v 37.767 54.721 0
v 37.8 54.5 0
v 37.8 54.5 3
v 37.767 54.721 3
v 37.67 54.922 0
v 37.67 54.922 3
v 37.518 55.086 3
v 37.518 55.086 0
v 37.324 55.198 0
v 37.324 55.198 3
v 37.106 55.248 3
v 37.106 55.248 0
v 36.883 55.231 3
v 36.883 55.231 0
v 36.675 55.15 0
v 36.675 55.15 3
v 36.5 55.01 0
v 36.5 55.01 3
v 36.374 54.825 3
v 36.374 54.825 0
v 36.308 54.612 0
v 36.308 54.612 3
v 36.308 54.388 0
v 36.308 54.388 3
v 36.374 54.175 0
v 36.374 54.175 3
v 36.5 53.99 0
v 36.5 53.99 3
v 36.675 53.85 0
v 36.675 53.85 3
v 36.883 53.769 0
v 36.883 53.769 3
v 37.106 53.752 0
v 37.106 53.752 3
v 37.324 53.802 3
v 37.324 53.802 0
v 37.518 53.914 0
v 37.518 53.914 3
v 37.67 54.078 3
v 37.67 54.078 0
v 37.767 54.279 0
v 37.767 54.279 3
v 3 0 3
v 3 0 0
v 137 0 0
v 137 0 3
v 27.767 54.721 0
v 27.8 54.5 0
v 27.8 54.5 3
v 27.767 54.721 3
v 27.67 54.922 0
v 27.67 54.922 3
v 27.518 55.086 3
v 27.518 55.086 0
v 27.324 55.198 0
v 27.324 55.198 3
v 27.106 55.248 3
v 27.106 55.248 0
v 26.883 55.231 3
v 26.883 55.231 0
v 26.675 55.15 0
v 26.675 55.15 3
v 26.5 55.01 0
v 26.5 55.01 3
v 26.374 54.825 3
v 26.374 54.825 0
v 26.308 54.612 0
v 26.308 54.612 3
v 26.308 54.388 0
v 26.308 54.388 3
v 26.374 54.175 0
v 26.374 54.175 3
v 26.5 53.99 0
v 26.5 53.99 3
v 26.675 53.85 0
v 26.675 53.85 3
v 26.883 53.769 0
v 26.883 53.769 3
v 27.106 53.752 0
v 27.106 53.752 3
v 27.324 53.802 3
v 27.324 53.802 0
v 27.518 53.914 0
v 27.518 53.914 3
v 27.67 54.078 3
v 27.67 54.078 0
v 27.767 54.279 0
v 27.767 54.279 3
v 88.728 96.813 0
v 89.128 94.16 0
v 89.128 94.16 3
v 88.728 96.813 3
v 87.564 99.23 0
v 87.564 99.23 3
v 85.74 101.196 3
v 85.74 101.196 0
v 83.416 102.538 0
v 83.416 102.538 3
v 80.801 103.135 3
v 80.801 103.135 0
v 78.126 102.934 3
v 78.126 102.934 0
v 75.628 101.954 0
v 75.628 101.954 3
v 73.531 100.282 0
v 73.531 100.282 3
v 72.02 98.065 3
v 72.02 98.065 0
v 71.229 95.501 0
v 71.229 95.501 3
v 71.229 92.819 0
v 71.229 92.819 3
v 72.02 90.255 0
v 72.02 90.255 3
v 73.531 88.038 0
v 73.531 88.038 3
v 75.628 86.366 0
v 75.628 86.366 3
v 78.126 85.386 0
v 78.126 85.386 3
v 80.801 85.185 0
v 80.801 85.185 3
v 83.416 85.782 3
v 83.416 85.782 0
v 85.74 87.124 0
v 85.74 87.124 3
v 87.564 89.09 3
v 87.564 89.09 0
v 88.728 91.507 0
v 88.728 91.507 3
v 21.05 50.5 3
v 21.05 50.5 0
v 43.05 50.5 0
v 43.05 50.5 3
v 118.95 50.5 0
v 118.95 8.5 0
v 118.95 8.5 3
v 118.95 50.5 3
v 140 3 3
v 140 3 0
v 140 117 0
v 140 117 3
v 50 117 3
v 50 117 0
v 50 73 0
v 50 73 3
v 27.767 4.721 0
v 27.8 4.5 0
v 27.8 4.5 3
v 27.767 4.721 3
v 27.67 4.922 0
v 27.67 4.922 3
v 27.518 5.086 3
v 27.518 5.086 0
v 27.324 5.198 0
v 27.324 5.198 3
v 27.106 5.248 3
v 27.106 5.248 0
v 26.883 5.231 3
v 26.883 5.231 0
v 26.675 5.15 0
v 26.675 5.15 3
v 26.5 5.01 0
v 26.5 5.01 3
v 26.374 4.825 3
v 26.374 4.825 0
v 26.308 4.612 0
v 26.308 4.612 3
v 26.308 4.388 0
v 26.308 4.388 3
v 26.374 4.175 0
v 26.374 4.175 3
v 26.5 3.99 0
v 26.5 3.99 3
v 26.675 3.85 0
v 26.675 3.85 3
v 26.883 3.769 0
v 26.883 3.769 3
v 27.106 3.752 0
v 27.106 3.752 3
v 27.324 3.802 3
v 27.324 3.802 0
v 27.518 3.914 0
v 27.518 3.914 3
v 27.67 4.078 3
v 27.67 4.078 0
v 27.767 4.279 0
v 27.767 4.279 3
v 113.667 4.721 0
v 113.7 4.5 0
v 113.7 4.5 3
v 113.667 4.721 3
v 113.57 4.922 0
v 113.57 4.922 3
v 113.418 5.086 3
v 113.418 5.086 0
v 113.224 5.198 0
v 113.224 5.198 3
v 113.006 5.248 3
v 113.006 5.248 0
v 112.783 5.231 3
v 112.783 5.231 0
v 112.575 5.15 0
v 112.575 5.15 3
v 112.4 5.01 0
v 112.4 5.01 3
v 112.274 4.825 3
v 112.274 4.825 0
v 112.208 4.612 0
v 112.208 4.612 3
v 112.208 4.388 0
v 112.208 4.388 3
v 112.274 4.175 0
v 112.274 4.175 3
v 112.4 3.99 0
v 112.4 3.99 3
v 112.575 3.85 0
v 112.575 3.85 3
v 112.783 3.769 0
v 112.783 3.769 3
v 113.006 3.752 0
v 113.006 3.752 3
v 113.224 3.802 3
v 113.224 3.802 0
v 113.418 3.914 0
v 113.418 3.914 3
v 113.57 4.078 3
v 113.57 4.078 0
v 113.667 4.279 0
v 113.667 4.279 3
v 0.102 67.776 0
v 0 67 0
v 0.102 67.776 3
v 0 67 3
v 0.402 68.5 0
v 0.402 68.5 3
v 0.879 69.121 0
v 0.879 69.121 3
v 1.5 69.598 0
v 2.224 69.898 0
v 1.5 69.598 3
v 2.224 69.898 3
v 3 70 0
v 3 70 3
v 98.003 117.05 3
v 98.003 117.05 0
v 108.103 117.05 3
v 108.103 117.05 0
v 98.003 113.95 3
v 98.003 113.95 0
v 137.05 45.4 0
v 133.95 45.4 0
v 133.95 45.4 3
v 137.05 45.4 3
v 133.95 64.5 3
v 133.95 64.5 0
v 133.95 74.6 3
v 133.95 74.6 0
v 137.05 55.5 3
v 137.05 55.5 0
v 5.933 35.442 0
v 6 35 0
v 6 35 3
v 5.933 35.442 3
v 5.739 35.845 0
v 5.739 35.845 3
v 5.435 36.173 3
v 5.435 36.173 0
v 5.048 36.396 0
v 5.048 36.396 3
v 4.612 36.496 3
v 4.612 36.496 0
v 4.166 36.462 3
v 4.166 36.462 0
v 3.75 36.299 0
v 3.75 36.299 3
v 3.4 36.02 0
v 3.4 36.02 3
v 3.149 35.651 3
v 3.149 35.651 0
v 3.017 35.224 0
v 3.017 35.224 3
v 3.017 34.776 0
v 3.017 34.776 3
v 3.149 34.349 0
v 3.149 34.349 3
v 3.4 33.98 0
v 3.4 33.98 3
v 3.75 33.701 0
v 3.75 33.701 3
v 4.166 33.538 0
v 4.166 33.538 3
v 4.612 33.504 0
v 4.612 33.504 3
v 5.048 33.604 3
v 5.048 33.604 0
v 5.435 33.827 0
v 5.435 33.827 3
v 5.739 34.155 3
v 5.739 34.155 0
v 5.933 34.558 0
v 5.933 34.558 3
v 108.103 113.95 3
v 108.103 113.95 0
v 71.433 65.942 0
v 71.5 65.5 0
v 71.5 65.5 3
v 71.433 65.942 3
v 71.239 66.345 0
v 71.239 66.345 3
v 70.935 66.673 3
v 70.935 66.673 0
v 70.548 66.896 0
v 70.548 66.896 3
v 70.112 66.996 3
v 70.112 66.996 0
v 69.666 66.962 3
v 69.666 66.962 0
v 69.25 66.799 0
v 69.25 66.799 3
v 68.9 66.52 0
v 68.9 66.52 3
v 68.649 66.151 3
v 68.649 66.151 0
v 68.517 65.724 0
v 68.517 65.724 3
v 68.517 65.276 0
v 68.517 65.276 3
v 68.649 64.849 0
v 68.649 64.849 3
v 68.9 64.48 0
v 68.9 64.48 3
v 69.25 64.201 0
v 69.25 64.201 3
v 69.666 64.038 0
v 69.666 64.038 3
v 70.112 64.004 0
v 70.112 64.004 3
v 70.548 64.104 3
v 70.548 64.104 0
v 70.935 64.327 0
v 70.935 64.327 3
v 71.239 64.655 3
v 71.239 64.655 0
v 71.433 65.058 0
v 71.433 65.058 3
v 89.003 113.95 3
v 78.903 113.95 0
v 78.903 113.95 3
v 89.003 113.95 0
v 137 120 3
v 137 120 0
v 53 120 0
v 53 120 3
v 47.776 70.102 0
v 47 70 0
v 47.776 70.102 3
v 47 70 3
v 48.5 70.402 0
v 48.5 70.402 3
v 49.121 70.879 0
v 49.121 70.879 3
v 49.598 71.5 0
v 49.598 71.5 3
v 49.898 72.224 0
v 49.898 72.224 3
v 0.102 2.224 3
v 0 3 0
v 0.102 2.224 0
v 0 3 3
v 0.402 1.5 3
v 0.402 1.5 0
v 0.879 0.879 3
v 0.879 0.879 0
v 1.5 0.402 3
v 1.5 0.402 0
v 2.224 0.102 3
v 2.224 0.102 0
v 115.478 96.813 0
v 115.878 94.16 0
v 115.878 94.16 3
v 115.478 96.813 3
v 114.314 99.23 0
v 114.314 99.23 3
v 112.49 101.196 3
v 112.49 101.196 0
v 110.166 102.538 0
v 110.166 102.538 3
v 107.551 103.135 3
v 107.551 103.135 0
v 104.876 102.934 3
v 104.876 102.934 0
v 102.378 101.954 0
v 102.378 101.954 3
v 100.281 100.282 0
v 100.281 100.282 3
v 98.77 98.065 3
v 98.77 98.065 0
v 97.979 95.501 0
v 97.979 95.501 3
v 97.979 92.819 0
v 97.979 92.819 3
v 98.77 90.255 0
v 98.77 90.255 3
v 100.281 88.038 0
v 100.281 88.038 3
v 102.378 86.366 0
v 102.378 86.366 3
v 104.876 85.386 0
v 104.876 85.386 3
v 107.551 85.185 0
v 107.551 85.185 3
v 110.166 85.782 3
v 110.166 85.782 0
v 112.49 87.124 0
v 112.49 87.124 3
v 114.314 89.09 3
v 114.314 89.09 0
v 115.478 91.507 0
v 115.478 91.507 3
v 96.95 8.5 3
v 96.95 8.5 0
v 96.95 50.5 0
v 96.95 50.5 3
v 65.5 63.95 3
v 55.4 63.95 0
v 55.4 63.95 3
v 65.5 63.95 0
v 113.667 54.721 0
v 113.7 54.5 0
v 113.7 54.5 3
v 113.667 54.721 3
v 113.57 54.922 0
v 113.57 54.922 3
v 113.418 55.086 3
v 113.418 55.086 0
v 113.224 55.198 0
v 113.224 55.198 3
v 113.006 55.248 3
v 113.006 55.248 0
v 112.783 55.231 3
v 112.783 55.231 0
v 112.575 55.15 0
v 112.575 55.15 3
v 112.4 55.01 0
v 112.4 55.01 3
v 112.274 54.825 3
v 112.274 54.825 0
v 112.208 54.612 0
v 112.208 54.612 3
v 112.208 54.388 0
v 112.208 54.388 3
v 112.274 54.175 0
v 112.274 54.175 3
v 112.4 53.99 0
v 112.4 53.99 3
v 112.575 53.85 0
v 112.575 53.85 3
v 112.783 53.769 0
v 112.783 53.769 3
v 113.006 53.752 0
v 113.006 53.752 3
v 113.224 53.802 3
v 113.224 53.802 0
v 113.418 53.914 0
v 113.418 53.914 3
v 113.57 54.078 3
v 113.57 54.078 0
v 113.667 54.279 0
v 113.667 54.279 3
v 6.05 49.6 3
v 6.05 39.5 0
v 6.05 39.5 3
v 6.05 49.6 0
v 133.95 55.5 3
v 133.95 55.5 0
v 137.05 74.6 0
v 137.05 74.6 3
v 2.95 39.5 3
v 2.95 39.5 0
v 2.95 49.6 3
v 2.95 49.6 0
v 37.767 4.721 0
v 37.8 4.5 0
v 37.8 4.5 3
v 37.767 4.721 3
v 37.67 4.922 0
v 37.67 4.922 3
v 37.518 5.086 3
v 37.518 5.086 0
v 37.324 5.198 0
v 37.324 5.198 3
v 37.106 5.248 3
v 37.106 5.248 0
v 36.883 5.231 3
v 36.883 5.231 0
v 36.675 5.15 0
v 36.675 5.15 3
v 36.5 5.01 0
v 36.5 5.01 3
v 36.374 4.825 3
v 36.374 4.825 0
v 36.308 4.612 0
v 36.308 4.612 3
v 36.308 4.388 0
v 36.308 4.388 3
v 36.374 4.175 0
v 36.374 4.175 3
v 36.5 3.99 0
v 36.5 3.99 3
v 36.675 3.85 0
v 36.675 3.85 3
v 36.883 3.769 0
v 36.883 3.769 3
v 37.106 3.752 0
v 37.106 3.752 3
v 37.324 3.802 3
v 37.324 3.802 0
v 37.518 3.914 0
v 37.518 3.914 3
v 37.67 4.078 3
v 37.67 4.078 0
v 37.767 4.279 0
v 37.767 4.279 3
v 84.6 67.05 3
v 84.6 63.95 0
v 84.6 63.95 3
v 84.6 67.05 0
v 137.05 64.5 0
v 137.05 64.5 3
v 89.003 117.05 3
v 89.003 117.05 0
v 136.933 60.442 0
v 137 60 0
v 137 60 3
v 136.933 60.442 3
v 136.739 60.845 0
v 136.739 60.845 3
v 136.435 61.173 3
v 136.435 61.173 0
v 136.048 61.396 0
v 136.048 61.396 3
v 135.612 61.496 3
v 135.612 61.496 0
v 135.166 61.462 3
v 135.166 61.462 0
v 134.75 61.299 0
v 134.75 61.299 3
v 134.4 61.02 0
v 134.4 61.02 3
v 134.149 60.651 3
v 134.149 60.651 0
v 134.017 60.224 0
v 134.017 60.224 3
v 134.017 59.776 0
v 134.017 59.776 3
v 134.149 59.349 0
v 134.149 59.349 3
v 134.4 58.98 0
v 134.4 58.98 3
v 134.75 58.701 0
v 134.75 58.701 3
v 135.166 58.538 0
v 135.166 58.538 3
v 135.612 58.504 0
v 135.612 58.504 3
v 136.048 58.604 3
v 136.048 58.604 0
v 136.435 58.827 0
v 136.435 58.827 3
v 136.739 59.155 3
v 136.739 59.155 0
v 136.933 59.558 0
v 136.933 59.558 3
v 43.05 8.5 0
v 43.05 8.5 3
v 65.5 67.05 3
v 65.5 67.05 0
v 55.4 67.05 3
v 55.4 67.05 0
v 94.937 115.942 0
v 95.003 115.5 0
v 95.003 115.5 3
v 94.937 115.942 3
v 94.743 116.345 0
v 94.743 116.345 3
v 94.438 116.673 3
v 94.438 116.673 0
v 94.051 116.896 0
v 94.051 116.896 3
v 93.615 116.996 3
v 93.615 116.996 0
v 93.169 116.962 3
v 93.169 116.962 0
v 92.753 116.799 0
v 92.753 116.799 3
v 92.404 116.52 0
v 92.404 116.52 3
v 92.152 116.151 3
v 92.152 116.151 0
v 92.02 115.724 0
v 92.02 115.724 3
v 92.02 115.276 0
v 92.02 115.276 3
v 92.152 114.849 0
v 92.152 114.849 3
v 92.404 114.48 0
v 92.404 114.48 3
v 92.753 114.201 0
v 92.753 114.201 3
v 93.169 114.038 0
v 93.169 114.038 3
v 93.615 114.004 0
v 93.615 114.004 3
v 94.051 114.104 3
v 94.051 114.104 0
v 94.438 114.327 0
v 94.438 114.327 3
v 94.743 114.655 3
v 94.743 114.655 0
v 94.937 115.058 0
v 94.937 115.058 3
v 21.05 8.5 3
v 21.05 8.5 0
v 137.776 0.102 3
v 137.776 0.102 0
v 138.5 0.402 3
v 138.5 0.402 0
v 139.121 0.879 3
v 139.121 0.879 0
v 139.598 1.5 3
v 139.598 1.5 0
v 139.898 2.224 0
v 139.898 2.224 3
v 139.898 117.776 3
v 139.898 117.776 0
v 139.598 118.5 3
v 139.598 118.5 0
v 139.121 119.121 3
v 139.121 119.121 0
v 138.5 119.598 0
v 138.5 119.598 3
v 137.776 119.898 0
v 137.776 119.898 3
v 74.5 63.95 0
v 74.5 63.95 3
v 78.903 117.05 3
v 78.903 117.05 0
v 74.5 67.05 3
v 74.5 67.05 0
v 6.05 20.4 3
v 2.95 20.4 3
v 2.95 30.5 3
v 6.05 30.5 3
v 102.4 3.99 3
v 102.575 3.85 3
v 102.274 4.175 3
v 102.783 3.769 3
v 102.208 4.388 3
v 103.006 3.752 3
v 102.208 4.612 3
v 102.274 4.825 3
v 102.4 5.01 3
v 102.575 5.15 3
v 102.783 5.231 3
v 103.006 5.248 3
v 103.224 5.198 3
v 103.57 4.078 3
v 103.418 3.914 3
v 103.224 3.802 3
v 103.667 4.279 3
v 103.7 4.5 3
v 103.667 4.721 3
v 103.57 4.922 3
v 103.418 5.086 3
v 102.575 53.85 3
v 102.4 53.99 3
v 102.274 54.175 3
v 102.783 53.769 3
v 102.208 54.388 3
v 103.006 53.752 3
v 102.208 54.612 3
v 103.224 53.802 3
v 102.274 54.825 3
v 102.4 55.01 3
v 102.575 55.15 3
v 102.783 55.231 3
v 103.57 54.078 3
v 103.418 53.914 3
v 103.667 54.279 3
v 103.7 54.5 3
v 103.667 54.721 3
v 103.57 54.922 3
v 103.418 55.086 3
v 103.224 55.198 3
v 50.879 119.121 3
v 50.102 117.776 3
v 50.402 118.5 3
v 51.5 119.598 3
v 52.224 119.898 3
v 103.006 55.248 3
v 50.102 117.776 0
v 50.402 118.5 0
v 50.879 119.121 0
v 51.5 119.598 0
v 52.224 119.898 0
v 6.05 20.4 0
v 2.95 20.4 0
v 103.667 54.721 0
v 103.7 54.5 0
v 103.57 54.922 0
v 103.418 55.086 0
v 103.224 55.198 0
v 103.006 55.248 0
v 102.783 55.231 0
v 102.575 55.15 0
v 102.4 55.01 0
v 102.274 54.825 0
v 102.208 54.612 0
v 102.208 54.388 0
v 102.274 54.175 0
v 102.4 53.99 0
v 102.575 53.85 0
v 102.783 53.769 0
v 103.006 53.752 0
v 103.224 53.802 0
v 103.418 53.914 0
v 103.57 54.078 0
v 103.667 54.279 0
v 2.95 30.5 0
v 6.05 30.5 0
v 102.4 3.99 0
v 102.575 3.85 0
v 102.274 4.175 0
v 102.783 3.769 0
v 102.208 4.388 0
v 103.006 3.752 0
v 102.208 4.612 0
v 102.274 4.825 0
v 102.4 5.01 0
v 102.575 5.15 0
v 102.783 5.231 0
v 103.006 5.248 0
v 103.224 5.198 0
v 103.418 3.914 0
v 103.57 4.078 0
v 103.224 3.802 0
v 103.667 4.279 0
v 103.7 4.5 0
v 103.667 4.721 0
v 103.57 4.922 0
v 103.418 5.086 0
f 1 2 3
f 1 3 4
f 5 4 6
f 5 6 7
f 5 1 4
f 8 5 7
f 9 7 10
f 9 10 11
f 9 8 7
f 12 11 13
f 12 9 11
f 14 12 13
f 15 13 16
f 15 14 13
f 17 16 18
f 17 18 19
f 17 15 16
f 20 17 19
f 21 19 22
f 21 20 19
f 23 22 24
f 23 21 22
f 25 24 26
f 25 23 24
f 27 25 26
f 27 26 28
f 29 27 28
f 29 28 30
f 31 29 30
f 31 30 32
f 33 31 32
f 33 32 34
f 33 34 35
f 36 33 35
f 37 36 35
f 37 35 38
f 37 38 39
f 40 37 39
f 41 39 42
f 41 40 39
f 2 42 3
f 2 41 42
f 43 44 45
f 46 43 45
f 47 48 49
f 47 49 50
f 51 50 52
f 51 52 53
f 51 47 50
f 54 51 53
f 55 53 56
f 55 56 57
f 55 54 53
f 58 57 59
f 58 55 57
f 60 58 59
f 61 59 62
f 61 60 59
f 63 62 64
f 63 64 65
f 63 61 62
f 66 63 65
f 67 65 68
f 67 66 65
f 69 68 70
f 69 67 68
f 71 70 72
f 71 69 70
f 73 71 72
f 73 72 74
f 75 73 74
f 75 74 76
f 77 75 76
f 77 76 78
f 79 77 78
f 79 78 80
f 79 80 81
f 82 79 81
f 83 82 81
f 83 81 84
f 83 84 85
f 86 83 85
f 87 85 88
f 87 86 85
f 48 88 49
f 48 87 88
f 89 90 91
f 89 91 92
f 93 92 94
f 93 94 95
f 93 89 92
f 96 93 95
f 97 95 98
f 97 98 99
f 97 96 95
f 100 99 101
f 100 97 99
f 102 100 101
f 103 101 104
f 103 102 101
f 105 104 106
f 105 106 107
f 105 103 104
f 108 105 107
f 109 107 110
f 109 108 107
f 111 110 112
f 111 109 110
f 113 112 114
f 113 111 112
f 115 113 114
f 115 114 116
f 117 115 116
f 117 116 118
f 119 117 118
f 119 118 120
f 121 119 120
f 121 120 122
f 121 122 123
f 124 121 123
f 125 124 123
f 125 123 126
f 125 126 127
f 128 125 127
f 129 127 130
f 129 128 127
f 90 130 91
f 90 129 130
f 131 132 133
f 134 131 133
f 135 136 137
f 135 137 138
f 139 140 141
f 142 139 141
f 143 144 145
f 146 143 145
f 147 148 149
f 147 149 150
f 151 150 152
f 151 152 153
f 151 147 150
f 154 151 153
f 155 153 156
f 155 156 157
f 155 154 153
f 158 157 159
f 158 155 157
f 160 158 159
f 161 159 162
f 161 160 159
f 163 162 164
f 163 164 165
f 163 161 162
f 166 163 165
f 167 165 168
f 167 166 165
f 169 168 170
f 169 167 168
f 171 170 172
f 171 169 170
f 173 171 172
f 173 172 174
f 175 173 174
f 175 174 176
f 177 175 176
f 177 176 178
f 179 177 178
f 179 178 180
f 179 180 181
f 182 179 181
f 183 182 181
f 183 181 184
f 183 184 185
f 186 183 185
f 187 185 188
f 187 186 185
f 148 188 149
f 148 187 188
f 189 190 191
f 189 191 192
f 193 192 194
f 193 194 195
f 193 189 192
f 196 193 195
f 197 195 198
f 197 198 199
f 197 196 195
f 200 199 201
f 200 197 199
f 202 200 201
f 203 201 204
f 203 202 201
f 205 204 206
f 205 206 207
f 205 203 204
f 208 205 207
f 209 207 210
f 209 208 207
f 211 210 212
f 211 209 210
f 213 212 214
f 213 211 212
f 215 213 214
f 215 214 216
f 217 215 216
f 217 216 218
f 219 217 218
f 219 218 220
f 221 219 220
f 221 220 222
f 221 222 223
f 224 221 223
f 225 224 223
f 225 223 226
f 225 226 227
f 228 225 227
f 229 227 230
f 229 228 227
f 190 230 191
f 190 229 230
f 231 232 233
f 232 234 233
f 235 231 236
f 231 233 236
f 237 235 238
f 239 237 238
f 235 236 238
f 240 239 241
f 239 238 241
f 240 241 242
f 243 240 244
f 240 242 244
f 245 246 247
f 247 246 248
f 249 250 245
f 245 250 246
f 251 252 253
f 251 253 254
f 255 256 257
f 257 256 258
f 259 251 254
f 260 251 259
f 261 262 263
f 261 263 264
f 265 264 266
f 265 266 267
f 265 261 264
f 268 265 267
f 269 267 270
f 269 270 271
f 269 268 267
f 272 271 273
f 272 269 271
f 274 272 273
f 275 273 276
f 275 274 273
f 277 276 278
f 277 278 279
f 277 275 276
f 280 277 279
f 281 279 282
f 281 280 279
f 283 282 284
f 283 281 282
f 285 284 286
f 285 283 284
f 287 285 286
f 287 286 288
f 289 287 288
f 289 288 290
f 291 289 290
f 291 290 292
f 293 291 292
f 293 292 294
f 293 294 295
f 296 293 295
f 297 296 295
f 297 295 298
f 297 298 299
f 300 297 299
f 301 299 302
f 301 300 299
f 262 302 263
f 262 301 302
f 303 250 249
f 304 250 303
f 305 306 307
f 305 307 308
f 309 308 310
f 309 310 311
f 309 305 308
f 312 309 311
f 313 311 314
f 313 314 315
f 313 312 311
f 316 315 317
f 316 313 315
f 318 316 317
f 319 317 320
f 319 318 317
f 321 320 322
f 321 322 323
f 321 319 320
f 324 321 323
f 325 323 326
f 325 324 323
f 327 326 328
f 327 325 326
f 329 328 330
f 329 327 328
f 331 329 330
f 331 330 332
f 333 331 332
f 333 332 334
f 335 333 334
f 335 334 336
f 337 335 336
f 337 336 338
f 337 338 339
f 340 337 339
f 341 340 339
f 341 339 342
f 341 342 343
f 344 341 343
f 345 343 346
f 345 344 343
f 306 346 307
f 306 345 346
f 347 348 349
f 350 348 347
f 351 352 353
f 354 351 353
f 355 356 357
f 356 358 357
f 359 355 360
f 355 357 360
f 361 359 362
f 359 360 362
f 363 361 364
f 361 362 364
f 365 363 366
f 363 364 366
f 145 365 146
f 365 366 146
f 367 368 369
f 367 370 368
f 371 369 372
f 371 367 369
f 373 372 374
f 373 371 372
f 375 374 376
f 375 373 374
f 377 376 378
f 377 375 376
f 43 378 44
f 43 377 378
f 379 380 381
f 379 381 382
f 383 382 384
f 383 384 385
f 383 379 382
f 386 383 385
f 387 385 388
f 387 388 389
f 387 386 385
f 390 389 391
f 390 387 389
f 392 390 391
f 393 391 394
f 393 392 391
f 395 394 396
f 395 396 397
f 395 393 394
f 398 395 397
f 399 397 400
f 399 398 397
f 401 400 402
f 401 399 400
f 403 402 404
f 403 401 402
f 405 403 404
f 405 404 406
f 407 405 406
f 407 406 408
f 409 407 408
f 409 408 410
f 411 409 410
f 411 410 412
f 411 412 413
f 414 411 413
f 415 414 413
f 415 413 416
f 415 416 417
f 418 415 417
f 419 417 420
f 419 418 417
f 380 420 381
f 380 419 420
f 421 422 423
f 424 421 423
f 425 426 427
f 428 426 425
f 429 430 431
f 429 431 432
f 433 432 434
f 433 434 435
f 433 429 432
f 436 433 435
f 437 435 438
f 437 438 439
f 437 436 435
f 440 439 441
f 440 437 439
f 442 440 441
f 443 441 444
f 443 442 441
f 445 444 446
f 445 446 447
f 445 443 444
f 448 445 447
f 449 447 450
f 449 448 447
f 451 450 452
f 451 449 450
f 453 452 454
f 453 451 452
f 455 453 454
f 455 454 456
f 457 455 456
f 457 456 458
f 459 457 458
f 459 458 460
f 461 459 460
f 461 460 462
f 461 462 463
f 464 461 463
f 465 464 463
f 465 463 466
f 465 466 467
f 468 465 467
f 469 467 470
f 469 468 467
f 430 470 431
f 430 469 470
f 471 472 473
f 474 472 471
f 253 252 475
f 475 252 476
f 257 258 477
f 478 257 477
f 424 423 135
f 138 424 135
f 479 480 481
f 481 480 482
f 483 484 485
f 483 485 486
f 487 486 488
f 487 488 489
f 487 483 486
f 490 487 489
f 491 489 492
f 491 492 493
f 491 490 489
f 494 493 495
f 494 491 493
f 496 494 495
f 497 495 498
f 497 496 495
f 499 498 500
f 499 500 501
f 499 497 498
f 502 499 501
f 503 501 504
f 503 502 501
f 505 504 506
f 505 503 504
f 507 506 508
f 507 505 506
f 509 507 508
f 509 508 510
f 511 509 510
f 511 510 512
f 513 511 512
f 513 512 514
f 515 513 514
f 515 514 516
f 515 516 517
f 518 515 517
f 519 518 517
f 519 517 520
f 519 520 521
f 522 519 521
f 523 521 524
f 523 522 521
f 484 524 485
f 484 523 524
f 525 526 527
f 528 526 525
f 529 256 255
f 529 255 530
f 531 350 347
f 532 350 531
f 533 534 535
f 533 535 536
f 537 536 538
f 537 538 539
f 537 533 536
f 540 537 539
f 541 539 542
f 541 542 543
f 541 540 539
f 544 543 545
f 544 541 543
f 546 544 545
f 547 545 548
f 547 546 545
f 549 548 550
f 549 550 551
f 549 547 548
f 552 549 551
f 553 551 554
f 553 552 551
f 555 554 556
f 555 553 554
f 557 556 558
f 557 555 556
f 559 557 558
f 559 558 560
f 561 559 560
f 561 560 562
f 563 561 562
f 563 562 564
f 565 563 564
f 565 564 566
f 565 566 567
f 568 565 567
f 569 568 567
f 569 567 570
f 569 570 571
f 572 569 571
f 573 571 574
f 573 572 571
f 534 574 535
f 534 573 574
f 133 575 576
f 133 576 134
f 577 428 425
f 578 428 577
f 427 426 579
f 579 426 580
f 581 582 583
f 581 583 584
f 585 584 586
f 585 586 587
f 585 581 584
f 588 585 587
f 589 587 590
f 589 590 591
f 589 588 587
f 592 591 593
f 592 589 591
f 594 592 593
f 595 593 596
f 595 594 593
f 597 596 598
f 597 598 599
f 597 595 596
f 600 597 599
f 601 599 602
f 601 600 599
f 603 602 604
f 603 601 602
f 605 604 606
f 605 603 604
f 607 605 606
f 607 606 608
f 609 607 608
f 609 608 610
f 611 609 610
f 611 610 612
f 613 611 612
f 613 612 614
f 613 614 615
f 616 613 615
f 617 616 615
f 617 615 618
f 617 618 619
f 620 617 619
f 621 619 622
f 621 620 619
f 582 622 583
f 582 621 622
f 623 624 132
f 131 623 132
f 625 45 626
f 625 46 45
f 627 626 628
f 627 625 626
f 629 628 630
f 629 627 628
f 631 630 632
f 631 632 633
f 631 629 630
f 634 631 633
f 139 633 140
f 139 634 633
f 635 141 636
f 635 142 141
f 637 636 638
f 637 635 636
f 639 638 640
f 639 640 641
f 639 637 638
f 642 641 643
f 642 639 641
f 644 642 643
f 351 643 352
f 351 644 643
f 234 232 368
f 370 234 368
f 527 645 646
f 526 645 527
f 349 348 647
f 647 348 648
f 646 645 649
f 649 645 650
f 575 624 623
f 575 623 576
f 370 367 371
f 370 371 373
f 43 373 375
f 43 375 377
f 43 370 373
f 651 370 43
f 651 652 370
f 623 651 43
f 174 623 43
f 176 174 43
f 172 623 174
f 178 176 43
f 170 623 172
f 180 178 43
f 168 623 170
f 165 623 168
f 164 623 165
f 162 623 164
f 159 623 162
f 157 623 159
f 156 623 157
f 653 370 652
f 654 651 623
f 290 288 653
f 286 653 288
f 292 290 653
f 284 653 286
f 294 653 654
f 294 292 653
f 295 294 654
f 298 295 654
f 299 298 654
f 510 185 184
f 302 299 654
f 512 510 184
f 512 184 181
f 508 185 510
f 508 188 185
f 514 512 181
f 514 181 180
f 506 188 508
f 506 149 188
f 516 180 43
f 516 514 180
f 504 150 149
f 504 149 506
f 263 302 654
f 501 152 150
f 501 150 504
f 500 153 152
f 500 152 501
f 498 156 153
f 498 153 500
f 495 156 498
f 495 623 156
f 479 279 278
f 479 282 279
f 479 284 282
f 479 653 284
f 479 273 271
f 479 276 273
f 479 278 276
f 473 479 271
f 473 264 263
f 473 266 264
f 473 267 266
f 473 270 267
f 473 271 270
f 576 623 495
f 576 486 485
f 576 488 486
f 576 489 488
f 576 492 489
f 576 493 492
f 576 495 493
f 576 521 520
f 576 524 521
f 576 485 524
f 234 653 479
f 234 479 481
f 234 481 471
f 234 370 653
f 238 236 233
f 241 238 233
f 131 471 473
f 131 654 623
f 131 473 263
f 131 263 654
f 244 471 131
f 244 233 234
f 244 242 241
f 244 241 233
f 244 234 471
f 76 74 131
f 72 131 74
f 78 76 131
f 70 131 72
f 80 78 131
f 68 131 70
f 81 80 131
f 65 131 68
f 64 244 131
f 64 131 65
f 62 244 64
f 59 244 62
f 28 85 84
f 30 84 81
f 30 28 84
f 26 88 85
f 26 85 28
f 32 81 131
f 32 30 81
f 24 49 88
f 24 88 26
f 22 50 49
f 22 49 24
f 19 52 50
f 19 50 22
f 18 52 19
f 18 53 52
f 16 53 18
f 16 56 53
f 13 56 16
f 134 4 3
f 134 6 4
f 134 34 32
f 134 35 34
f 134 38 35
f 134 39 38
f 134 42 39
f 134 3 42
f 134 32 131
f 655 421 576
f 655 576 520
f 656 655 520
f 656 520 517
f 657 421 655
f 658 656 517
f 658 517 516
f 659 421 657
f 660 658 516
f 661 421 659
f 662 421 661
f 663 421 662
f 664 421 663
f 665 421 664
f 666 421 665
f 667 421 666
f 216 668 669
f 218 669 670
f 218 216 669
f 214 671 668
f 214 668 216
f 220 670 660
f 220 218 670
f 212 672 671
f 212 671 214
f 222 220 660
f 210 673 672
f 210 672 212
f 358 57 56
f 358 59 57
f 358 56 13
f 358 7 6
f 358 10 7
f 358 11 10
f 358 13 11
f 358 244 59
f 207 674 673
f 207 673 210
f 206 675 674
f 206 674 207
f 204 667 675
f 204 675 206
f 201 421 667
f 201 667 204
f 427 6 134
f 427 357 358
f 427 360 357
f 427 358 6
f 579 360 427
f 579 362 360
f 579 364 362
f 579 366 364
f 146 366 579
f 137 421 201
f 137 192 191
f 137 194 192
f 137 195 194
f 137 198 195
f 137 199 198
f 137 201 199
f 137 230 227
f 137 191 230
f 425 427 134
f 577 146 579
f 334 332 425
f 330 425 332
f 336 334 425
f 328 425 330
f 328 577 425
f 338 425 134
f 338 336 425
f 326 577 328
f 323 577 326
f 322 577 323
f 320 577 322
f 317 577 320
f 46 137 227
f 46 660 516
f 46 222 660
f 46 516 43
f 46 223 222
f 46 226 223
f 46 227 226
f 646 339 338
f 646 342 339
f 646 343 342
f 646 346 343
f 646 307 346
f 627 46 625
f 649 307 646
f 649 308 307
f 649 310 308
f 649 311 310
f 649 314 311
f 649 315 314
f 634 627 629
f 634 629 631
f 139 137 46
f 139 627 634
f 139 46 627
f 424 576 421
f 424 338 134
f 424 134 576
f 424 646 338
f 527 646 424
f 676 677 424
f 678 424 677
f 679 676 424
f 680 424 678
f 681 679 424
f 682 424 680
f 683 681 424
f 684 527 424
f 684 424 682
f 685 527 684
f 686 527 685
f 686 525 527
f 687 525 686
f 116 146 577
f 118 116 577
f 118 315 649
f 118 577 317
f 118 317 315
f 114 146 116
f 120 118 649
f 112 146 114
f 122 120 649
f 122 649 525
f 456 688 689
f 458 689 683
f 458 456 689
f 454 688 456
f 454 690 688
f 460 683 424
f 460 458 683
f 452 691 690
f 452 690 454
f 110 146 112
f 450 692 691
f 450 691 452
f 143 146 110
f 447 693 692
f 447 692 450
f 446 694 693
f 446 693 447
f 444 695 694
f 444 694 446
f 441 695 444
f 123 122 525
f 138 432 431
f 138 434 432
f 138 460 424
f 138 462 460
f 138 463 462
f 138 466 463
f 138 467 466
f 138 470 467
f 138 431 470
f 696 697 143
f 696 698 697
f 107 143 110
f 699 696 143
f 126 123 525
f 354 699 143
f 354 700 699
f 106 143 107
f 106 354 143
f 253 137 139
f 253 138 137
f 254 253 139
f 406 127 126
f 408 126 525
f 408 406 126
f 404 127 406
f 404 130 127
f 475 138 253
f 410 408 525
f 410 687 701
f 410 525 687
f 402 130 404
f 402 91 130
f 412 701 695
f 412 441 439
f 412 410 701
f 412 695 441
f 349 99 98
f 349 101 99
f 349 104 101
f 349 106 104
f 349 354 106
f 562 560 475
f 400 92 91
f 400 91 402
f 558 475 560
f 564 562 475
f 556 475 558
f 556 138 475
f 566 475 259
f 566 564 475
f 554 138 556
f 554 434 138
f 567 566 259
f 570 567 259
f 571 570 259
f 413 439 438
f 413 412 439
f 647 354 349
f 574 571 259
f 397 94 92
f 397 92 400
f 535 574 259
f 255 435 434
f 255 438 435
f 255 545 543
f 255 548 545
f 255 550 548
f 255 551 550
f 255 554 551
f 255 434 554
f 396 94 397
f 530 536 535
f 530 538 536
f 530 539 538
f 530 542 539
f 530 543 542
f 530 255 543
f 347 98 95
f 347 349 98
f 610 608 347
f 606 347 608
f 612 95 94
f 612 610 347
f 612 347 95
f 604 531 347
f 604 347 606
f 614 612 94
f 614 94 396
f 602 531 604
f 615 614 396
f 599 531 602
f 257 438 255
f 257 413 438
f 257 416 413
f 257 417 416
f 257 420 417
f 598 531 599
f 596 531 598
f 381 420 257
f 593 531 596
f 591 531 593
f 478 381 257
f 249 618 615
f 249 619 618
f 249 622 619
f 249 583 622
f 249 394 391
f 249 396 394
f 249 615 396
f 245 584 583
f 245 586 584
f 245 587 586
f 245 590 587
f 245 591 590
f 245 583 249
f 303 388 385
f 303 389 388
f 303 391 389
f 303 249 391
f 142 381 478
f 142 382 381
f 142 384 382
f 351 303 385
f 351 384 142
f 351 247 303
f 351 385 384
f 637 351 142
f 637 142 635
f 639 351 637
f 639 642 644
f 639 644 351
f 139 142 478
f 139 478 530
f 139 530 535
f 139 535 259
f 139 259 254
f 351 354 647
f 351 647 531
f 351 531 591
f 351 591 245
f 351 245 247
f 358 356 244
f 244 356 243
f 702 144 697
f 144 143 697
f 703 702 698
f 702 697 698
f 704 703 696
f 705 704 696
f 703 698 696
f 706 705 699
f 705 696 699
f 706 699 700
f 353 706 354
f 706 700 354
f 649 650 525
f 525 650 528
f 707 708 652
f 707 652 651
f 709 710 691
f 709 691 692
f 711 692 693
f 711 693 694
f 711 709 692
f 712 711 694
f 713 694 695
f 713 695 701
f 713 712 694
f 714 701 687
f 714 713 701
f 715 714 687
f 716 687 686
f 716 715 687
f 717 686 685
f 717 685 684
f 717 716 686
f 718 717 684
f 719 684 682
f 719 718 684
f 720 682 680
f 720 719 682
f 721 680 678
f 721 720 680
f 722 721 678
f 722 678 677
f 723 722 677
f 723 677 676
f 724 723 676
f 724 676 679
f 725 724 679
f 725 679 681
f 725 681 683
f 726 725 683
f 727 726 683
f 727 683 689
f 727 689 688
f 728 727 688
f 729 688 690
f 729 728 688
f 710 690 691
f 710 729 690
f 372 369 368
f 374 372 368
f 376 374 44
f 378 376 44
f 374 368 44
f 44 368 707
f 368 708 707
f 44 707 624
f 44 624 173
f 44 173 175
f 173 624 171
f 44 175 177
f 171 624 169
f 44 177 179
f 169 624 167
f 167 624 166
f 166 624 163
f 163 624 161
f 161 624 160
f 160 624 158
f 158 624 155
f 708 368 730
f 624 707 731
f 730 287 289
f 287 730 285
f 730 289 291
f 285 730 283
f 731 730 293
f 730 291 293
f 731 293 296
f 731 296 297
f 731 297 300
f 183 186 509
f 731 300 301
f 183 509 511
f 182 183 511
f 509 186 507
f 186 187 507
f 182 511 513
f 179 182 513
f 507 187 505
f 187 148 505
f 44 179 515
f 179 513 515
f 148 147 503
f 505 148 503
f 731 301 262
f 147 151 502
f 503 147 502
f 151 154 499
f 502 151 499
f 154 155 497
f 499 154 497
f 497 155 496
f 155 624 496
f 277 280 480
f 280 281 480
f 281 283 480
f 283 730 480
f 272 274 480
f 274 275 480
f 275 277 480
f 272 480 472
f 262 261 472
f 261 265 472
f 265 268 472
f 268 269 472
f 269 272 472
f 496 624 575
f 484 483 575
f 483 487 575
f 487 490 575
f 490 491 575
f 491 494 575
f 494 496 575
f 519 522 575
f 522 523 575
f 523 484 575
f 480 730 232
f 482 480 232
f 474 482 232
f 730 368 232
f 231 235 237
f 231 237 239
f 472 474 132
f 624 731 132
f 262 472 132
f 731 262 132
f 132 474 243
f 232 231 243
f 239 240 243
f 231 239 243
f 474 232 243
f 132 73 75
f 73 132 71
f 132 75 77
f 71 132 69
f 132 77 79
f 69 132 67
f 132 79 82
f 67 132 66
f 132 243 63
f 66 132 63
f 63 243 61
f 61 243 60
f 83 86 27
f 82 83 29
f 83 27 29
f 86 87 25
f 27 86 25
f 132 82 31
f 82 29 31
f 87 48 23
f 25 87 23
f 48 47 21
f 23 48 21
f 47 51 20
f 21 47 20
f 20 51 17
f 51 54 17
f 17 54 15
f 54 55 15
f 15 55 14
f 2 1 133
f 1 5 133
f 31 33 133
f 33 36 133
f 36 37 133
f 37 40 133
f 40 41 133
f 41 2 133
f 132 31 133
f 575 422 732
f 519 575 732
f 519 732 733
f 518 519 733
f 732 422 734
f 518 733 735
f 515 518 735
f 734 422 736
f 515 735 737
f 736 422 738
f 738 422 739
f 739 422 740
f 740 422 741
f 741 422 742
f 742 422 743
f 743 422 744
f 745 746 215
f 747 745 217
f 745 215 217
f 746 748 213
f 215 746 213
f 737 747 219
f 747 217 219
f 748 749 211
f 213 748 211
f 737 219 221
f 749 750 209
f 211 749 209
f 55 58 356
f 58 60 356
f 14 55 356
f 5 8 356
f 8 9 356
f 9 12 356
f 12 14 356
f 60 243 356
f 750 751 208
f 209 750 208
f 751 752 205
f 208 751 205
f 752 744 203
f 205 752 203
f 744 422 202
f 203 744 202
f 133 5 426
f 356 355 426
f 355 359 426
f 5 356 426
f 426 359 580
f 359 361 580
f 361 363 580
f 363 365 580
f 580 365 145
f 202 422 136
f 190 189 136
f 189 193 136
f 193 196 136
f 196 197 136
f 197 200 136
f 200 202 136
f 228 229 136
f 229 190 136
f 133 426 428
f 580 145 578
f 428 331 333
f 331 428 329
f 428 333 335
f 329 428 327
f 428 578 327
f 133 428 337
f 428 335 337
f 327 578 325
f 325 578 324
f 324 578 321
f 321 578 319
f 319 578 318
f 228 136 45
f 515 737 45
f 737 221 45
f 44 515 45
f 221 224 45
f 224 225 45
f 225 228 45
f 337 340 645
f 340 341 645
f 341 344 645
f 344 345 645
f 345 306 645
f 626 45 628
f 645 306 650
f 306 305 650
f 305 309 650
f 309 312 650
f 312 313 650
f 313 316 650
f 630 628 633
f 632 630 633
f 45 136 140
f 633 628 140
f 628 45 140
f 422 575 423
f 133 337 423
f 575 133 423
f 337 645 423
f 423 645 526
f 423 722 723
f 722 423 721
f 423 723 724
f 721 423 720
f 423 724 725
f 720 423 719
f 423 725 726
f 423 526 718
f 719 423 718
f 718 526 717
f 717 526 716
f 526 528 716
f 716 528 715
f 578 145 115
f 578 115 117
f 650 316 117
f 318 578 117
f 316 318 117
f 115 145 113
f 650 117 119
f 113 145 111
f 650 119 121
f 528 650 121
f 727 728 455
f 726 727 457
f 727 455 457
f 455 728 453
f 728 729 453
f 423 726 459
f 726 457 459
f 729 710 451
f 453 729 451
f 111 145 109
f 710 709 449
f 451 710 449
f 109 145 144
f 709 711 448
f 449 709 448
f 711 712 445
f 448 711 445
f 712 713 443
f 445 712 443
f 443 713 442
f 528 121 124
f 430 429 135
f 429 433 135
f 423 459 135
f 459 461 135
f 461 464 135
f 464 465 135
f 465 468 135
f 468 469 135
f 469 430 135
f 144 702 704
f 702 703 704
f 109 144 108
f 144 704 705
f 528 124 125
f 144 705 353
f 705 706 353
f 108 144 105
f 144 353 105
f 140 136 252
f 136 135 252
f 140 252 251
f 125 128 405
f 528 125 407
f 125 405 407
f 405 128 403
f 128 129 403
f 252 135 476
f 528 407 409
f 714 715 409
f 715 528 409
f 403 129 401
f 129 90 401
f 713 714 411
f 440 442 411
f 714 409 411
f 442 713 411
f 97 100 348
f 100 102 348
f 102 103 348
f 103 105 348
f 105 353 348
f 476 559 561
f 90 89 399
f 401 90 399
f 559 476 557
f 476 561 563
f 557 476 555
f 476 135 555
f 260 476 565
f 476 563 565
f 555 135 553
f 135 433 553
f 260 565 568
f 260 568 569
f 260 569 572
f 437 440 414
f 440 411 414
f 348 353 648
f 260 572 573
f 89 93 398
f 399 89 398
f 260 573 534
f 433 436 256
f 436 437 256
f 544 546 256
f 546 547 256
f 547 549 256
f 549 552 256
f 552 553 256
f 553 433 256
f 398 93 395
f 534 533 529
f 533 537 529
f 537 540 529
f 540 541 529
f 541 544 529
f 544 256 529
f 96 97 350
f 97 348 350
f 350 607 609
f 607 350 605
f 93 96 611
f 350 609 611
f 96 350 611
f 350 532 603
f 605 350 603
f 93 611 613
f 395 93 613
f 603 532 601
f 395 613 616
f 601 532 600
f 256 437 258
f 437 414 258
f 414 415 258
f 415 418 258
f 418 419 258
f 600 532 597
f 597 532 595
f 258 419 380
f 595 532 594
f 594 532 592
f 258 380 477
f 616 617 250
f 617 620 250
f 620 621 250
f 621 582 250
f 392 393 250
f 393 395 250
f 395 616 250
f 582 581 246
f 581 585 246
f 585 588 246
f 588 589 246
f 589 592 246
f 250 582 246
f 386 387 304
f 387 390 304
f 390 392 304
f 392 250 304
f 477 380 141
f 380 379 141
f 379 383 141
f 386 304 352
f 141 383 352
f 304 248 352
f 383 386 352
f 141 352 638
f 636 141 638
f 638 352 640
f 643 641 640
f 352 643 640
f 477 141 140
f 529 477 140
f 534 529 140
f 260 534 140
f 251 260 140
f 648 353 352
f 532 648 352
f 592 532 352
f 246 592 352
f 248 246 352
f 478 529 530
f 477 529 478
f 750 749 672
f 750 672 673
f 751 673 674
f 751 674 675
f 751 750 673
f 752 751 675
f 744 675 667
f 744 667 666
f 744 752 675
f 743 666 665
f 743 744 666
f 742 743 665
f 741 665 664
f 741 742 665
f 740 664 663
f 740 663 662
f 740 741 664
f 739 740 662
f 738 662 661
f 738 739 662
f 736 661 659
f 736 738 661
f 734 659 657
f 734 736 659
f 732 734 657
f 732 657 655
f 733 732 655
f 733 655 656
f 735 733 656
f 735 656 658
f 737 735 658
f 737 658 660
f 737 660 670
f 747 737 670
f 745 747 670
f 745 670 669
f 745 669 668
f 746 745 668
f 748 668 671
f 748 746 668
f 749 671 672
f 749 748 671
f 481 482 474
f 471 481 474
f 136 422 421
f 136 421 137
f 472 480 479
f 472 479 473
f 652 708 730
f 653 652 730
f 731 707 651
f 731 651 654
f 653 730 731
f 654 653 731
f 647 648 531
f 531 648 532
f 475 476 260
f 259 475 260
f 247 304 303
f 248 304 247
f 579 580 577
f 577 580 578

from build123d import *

# Parameters (mm, degrees)
SKETCH1_R           = 0.75
SKETCH1_W           = 3.1
SKETCH1_H           = 10.1
SKETCH1_W_2         = 22
SKETCH1_H_2         = 42
SKETCH1_R_2         = 1.5
SKETCH1_W_3         = 10.1
SKETCH1_H_3         = 3.1
SKETCH1_R_3         = 9
BOSS_EXTRUDE4_DEPTH = 3
FILLET1_R           = 3


with BuildPart() as part:
    # Sketch1 → Boss-Extrude4 (new body)
    with BuildSketch(Plane.XY):
        Polygon((0, 70), (0, 0), (140, 0), (140, 120), (50, 120), (50, 70), align=None)
        with Locations((27.05, 4.5)):
            Circle(SKETCH1_R, mode=Mode.SUBTRACT)
        with Locations((4.5, 25.45)):
            Rectangle(SKETCH1_W, SKETCH1_H, mode=Mode.SUBTRACT)
        with Locations((32.05, 29.500000083)):
            Rectangle(SKETCH1_W_2, SKETCH1_H_2, mode=Mode.SUBTRACT)
        with Locations((37.05, 4.5)):
            Circle(SKETCH1_R, mode=Mode.SUBTRACT)
        with Locations((4.5, 35)):
            Circle(SKETCH1_R_2, mode=Mode.SUBTRACT)
        with Locations((4.5, 44.55)):
            Rectangle(SKETCH1_W, SKETCH1_H, mode=Mode.SUBTRACT)
        with Locations((27.05, 54.500000165)):
            Circle(SKETCH1_R, mode=Mode.SUBTRACT)
        with Locations((37.05, 54.500000165)):
            Circle(SKETCH1_R, mode=Mode.SUBTRACT)
        with Locations((102.95, 4.5)):
            Circle(SKETCH1_R, mode=Mode.SUBTRACT)
        with Locations((112.95, 4.5)):
            Circle(SKETCH1_R, mode=Mode.SUBTRACT)
        with Locations((107.95, 29.500000083)):
            Rectangle(SKETCH1_W_2, SKETCH1_H_2, mode=Mode.SUBTRACT)
        with Locations((102.95, 54.500000165)):
            Circle(SKETCH1_R, mode=Mode.SUBTRACT)
        with Locations((112.95, 54.500000165)):
            Circle(SKETCH1_R, mode=Mode.SUBTRACT)
        with Locations((135.5, 50.45)):
            Rectangle(SKETCH1_W, SKETCH1_H, mode=Mode.SUBTRACT)
        with Locations((60.45, 65.5)):
            Rectangle(SKETCH1_W_3, SKETCH1_H_3, mode=Mode.SUBTRACT)
        with Locations((70, 65.5)):
            Circle(SKETCH1_R_2, mode=Mode.SUBTRACT)
        with Locations((79.55, 65.5)):
            Rectangle(SKETCH1_W_3, SKETCH1_H_3, mode=Mode.SUBTRACT)
        with Locations((135.5, 60)):
            Circle(SKETCH1_R_2, mode=Mode.SUBTRACT)
        with Locations((135.5, 69.55)):
            Rectangle(SKETCH1_W, SKETCH1_H, mode=Mode.SUBTRACT)
        with Locations((80.128224089, 94.16)):
            Circle(SKETCH1_R_3, mode=Mode.SUBTRACT)
        with Locations((83.953224089, 115.5)):
            Rectangle(SKETCH1_W_3, SKETCH1_H_3, mode=Mode.SUBTRACT)
        with Locations((93.503224089, 115.5)):
            Circle(SKETCH1_R_2, mode=Mode.SUBTRACT)
        with Locations((103.053224089, 115.5)):
            Rectangle(SKETCH1_W_3, SKETCH1_H_3, mode=Mode.SUBTRACT)
        with Locations((106.878224089, 94.16)):
            Circle(SKETCH1_R_3, mode=Mode.SUBTRACT)
    extrude(amount=BOSS_EXTRUDE4_DEPTH)

    # Fillet1
    fillet1_edges = [part.edges().sort_by_distance(p)[0] for p in [
        (50, 120, 1.5),
        (140, 120, 1.5),
        (140, 0, 1.5),
        (0, 0, 1.5),
        (0, 70, 1.5),
        (50, 70, 1.5),
    ]]
    fillet(fillet1_edges, radius=FILLET1_R)


solid = part.part
